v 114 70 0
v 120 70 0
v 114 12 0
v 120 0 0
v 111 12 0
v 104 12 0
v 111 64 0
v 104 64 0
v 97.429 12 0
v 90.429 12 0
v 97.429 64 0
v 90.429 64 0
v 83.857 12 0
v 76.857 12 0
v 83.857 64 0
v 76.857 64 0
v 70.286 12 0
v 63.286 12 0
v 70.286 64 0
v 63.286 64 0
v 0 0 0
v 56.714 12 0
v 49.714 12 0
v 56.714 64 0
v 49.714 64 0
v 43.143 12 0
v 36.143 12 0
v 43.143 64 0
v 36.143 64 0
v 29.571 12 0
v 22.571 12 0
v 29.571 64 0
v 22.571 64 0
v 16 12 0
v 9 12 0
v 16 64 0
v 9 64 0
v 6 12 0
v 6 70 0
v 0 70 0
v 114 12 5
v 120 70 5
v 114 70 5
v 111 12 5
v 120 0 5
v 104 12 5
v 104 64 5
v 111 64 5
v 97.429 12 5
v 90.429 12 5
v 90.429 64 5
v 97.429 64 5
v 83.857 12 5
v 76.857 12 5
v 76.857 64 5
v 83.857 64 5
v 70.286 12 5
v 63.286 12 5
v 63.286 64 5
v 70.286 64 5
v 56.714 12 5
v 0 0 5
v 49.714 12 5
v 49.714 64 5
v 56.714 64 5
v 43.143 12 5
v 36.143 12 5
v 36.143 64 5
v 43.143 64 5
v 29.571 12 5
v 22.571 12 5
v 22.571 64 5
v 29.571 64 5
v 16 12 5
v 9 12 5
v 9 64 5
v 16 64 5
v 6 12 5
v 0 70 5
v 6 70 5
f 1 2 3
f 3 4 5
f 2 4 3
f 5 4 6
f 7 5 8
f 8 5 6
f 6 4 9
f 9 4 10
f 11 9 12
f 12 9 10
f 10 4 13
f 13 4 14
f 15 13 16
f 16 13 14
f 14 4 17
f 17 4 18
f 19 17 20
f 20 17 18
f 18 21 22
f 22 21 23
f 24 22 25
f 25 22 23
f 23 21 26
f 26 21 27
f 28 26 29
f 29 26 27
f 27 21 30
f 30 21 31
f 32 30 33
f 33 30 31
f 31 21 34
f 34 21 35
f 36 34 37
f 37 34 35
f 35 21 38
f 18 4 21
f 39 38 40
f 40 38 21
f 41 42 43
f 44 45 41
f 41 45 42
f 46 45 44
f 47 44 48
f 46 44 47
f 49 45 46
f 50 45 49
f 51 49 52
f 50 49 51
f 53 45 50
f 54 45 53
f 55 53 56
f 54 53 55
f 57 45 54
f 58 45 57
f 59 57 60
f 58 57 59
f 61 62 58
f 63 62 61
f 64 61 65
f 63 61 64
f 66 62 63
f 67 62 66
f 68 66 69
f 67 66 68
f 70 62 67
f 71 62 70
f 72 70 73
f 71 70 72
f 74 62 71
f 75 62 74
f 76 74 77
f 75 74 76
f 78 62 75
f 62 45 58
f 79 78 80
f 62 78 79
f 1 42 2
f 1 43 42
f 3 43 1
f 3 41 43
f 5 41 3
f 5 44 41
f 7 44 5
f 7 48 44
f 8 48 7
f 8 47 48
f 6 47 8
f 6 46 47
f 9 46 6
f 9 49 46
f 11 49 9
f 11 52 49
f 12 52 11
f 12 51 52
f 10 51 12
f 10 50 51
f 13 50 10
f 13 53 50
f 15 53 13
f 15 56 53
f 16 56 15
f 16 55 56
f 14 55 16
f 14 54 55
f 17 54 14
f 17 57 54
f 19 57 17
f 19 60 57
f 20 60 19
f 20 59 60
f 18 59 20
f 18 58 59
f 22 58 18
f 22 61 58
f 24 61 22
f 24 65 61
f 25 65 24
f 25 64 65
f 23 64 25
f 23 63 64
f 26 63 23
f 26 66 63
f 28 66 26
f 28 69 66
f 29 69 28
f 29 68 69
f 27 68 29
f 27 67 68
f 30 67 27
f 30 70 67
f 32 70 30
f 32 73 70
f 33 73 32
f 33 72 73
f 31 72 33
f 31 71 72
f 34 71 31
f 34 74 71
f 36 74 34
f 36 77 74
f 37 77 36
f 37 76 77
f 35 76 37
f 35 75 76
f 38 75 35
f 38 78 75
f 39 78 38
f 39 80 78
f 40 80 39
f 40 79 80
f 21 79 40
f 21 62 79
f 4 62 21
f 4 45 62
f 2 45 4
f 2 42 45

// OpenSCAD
$fn = 32;

// ----------------------------------------------------------------------
// Guard grille: 8 slats over a 120 x 70 mm plate
// ----------------------------------------------------------------------

// --- parameters (mm) ---
profile_height = 5;       // extrusion height
profile_points = 40;      // points of the closed outline

profile = [[0, 0], [120, 0], [120, 70], [114, 70], [114, 12], [111, 12], [111, 64], [104, 64], [104, 12], [97.429, 12], [97.429, 64], [90.429, 64], [90.429, 12], [83.857, 12], [83.857, 64], [76.857, 64], [76.857, 12], [70.286, 12], [70.286, 64], [63.286, 64], [63.286, 12], [56.714, 12], [56.714, 64], [49.714, 64], [49.714, 12], [43.143, 12], [43.143, 64], [36.143, 64], [36.143, 12], [29.571, 12], [29.571, 64], [22.571, 64], [22.571, 12], [16, 12], [16, 64], [9, 64], [9, 12], [6, 12], [6, 70], [0, 70]];  // single closed polygon, 40 points, counter clockwise

// --- the one profile operation ---
linear_extrude(height = profile_height) polygon(points = profile);
